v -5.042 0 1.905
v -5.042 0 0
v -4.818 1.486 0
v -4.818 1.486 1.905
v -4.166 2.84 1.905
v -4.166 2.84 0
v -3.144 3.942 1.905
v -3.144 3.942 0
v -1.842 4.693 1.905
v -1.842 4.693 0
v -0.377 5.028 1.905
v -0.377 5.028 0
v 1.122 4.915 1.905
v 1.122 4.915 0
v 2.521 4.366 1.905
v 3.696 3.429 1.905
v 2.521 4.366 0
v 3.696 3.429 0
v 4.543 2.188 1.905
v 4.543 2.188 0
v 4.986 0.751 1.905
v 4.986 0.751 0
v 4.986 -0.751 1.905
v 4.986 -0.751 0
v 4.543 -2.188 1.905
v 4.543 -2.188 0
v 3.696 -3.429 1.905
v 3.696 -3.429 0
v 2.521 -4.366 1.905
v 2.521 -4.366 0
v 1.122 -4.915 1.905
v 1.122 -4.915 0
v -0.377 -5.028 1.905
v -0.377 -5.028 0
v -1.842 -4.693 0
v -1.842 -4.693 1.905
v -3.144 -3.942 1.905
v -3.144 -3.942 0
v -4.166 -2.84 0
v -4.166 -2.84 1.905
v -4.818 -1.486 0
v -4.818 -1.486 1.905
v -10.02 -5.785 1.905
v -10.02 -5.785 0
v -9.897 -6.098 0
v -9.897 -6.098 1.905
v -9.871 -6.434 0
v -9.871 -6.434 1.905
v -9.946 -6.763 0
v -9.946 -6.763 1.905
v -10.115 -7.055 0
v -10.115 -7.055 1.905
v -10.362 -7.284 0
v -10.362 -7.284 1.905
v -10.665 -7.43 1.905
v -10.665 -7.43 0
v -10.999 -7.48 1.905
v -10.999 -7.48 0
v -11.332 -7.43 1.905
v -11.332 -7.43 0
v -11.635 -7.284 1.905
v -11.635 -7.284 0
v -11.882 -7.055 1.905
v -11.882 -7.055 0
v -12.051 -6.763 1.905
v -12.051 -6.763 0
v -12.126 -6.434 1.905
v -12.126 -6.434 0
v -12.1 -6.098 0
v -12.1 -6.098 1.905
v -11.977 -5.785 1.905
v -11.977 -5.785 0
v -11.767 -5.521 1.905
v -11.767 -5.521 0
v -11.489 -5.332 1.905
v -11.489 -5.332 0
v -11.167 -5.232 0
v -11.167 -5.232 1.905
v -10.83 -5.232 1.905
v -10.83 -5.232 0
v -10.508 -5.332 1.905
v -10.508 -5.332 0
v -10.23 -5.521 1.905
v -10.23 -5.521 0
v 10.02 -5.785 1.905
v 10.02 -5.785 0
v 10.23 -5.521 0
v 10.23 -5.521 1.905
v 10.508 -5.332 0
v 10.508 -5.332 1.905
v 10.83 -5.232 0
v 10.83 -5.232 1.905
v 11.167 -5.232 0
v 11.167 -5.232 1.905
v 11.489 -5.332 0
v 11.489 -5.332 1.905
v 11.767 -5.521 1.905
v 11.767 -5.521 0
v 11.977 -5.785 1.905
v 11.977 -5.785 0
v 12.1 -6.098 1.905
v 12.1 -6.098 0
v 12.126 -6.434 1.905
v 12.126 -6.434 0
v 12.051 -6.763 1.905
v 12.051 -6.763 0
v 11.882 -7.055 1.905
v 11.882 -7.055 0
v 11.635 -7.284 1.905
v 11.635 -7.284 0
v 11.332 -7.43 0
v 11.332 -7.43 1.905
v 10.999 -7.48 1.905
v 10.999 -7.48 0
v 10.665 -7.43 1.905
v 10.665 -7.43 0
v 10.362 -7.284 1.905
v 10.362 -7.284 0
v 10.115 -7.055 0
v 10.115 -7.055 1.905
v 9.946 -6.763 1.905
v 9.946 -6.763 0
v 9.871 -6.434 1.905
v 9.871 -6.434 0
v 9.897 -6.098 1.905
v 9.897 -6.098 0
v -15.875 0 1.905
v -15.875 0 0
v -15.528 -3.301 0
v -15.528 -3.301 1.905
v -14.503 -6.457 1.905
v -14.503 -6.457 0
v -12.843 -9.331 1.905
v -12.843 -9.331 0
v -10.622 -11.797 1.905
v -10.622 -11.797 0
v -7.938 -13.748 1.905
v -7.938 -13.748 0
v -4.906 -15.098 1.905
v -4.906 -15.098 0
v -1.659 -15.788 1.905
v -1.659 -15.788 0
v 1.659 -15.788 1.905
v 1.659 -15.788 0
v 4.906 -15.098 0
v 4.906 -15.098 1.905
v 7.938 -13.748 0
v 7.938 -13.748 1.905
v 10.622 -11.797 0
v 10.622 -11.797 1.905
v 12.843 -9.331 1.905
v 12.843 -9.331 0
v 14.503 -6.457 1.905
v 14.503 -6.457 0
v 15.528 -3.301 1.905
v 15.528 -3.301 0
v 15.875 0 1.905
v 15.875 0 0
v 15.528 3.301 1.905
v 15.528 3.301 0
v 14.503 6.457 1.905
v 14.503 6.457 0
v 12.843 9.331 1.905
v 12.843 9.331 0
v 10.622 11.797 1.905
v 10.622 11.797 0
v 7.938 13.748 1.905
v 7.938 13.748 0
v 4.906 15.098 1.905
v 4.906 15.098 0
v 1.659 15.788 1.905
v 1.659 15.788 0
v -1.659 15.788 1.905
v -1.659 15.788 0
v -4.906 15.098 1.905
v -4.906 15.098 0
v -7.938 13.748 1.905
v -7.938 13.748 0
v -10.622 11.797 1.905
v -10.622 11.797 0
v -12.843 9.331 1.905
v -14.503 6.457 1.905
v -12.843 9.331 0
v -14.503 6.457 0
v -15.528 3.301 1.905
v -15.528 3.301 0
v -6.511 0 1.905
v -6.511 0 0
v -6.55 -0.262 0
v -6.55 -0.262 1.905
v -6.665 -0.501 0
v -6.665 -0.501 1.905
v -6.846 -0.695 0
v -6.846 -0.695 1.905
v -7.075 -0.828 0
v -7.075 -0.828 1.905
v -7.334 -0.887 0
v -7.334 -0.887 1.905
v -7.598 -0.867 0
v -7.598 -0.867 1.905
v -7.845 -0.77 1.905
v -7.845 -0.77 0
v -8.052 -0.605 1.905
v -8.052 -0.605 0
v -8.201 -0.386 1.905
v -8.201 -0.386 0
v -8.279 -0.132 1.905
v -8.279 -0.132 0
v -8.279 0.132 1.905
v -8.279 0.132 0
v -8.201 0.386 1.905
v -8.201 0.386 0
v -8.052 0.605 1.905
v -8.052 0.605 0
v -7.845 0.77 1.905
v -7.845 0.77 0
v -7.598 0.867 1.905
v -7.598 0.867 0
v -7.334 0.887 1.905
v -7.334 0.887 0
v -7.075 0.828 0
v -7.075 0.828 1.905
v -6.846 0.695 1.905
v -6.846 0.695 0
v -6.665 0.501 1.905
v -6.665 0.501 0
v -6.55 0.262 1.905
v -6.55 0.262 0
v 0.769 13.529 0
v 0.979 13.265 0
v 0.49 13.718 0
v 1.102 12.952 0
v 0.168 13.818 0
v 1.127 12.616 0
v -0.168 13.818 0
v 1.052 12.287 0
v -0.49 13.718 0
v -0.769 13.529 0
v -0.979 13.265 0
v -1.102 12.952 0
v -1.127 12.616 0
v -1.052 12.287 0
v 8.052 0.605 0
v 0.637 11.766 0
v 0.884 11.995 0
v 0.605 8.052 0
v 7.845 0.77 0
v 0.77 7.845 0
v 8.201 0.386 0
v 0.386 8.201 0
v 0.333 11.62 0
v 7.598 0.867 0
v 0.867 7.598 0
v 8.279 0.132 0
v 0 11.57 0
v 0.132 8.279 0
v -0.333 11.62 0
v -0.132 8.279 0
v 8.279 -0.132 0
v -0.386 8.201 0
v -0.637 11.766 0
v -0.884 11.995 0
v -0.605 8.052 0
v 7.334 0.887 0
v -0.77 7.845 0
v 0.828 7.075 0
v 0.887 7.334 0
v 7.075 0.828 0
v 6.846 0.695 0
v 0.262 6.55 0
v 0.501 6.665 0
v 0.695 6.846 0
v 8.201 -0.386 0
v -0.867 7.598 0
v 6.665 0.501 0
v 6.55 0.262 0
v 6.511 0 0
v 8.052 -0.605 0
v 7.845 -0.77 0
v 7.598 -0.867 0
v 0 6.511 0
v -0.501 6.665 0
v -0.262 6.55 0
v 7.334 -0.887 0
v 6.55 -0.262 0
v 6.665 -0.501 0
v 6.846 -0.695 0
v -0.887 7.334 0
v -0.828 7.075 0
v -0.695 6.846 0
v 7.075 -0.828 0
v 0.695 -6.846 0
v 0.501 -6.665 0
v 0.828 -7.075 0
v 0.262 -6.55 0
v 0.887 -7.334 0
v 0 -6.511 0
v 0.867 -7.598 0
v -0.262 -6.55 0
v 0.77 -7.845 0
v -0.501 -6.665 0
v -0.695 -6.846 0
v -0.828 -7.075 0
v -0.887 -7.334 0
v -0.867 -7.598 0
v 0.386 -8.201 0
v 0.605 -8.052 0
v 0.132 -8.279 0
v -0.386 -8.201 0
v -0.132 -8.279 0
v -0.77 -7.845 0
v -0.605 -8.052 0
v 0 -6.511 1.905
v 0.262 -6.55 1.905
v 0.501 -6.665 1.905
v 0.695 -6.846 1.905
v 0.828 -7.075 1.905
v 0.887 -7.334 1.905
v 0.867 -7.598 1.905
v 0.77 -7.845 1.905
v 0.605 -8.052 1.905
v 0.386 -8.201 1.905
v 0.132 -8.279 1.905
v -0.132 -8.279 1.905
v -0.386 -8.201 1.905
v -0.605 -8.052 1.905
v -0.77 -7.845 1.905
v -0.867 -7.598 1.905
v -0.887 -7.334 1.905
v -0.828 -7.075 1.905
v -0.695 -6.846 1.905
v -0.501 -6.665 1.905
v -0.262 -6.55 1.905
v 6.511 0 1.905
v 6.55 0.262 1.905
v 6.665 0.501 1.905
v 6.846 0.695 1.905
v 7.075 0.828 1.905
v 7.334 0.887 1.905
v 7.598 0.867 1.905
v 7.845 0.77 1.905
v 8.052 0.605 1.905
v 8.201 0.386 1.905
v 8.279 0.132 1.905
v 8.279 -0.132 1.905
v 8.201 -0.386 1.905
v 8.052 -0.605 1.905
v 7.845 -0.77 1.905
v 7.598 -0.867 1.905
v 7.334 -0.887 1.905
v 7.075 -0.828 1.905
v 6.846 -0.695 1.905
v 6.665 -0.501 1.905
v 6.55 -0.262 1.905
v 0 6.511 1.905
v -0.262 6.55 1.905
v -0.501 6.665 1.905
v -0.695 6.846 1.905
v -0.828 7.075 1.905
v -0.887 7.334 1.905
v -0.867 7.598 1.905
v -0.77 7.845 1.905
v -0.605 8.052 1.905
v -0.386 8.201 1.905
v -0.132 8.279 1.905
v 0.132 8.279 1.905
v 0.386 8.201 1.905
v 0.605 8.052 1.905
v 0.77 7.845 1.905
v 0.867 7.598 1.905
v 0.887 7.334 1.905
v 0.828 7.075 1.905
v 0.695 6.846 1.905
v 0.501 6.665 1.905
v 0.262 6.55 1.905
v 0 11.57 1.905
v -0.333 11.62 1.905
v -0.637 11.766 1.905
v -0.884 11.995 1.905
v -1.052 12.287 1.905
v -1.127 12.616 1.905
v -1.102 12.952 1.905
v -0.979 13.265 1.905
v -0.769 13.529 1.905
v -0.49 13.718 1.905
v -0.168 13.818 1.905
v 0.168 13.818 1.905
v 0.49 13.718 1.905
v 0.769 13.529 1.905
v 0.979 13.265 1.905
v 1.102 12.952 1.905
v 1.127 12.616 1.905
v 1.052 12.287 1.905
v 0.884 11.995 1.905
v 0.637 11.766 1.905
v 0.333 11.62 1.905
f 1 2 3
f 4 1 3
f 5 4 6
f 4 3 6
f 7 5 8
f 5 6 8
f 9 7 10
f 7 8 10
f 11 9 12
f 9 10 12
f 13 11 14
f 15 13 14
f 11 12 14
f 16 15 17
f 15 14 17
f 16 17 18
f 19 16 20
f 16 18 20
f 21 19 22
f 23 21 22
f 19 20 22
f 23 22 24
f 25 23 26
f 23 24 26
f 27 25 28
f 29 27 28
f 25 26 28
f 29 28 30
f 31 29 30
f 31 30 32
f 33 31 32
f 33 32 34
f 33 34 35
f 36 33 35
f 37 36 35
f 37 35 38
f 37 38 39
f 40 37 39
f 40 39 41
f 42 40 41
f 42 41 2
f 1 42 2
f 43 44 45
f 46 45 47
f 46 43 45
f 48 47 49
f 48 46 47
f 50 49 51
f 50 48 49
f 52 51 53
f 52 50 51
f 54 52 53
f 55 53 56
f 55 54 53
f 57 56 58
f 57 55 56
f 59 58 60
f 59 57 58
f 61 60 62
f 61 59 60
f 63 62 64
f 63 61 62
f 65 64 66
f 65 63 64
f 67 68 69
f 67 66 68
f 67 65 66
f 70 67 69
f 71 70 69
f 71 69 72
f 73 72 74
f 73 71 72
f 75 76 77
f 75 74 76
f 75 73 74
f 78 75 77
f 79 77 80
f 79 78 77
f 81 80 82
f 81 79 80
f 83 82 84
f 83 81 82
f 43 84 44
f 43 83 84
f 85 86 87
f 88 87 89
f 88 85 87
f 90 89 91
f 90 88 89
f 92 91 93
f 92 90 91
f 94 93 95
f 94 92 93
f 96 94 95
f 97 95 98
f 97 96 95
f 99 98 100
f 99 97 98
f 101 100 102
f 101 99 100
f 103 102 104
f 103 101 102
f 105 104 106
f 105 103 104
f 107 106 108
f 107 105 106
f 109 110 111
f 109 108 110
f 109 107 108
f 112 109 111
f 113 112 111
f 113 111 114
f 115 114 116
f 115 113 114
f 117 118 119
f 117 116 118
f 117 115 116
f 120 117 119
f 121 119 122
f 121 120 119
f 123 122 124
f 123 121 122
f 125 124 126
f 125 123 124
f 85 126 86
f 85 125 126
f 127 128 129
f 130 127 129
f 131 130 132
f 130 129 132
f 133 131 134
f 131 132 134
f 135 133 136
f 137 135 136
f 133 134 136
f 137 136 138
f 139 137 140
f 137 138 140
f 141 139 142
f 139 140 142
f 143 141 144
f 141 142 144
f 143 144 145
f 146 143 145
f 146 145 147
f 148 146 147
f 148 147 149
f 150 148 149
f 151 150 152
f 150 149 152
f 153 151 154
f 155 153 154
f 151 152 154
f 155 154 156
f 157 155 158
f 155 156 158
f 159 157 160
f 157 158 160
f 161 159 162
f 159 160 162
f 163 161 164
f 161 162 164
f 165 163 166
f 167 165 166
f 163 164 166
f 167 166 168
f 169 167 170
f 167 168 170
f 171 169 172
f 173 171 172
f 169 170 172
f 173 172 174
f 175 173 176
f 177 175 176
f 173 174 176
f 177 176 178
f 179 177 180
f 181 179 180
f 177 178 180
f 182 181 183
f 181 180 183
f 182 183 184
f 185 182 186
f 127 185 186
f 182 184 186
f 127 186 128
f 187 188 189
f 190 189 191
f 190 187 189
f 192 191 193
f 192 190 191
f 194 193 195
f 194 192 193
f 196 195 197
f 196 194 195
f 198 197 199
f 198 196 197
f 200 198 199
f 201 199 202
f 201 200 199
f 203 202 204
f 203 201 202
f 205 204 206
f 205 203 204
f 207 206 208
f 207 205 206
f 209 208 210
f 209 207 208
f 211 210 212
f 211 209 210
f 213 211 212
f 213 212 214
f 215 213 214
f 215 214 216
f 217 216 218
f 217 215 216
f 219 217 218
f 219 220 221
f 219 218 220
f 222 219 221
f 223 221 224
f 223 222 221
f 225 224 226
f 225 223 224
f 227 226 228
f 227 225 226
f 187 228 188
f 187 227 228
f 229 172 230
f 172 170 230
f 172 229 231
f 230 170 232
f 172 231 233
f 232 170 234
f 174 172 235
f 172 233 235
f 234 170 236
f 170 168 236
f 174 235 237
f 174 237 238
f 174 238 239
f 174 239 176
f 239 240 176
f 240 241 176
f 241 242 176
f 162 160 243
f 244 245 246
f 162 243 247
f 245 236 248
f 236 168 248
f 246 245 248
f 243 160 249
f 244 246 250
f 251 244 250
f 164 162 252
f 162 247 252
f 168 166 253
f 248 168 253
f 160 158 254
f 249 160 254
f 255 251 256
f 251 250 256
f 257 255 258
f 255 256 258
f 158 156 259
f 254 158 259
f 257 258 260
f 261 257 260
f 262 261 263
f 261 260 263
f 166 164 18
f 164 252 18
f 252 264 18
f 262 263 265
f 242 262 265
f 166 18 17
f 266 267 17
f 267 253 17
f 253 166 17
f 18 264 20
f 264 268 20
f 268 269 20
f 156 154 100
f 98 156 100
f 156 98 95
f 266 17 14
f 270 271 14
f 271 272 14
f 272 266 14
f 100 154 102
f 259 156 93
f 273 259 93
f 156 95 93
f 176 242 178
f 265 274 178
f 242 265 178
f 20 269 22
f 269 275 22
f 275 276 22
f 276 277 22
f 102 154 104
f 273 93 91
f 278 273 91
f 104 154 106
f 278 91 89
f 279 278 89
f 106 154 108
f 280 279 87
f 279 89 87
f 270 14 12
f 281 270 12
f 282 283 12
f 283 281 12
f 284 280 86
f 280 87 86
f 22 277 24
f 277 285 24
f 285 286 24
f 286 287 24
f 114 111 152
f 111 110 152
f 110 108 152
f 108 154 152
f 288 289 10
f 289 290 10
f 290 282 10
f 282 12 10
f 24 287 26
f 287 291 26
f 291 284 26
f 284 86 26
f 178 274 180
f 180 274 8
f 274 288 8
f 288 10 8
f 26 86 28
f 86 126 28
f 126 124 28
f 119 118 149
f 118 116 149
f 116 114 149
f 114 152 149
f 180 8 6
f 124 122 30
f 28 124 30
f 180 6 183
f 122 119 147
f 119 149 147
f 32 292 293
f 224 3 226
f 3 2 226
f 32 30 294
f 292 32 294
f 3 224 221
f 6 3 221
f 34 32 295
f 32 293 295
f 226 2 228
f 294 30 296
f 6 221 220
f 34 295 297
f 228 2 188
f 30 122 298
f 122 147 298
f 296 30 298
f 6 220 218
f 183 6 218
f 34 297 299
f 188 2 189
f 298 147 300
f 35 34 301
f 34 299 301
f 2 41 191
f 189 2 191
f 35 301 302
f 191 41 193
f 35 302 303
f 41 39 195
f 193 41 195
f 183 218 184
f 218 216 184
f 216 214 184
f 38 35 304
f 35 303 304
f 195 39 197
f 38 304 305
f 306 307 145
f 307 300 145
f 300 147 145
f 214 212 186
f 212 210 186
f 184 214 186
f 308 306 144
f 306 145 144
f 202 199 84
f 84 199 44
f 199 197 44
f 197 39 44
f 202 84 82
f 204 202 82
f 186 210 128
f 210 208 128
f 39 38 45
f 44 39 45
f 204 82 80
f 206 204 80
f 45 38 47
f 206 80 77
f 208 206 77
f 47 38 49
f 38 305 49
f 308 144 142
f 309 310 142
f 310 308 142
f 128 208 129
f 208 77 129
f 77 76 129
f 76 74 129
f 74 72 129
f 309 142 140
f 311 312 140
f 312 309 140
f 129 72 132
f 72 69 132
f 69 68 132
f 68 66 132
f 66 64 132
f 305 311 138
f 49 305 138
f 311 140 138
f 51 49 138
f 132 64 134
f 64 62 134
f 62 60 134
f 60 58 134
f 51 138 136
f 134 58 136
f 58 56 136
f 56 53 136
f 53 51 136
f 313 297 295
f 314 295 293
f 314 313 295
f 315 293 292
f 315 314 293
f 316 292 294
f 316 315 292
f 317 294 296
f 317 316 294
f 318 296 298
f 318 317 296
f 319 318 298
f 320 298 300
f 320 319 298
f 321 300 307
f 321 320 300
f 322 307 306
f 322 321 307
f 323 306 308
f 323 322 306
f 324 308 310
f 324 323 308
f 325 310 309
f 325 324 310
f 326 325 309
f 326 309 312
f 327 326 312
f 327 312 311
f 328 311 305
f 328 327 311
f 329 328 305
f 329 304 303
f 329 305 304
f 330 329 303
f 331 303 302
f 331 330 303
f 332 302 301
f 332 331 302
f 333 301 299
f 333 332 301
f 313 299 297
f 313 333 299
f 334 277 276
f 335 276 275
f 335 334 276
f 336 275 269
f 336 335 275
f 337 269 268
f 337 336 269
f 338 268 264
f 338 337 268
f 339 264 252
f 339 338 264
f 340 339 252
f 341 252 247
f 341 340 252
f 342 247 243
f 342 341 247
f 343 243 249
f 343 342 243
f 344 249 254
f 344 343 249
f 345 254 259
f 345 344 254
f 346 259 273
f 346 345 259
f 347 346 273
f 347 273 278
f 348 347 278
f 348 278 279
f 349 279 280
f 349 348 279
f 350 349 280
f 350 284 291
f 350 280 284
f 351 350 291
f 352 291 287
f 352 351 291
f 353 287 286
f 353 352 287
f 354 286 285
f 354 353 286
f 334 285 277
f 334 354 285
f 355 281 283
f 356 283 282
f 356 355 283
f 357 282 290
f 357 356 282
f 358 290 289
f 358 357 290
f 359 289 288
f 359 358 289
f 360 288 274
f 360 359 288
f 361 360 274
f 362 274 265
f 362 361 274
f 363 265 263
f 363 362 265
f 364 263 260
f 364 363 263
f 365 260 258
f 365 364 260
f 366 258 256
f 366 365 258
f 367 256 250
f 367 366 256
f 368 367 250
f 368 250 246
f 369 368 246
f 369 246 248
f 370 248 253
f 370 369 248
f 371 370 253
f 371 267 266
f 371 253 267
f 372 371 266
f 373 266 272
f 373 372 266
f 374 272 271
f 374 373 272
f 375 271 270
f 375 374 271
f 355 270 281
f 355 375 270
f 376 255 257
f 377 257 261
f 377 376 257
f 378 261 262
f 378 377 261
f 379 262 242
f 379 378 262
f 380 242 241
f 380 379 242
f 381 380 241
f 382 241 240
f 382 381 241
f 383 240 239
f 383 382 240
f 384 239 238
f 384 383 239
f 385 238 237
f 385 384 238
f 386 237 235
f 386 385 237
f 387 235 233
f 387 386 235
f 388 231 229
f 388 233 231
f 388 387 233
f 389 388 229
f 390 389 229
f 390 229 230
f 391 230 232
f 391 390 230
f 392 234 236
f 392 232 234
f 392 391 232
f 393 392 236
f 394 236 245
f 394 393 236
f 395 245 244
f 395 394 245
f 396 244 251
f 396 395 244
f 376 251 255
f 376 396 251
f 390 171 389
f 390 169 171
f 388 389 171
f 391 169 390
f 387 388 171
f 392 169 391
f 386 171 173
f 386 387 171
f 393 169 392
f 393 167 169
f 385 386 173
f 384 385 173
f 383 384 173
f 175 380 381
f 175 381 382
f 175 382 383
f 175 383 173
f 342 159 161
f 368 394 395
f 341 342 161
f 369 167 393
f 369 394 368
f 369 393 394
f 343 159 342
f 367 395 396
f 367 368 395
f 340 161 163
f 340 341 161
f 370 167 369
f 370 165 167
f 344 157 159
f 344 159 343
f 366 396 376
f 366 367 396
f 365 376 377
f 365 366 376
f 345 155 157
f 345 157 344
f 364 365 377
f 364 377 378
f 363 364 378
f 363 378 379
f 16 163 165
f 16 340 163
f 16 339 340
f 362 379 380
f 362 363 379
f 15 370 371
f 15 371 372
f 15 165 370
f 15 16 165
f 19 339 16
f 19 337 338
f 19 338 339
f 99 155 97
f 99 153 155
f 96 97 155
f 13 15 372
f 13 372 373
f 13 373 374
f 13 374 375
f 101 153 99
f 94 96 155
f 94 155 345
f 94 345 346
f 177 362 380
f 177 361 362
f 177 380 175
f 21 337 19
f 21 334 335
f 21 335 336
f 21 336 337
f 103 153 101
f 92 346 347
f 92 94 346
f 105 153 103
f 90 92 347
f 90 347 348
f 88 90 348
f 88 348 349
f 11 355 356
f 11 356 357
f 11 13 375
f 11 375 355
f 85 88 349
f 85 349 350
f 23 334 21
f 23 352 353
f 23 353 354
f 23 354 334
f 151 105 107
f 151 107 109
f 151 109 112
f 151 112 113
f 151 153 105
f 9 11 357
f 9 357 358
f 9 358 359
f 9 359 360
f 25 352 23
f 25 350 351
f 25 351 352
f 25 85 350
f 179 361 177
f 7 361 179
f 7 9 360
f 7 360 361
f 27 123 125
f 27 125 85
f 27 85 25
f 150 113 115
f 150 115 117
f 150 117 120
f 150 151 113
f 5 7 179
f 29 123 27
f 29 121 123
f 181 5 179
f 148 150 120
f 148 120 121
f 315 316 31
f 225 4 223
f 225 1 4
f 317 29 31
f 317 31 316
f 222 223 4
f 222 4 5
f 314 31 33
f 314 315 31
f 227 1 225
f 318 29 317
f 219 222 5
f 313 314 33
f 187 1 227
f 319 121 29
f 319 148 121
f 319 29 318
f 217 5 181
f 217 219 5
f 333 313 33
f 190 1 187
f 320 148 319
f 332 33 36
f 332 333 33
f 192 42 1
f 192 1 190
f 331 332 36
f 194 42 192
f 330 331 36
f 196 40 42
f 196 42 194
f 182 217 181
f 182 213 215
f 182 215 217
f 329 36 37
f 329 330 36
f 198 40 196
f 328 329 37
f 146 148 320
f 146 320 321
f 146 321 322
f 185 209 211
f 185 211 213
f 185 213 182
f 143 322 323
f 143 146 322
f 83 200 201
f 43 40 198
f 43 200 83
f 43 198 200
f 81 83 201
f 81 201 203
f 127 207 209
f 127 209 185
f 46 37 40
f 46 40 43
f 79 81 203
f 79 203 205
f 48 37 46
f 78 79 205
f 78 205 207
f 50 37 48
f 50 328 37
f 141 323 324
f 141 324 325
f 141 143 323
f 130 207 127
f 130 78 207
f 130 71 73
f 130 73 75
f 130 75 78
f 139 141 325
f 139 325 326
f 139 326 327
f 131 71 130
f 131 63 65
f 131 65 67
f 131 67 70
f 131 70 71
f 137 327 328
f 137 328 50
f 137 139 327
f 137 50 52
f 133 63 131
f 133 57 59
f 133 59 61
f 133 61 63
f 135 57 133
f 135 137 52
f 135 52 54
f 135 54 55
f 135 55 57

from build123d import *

# Parameters (mm, degrees)
SKETCH1_R                    = 15.875
SKETCH1_R_2                  = 3.96875
BOSS_EXTRUDE1_DEPTH          = 1.905
X_0_397_DIAMETER_HOLE1_D     = 10.0838
X_0_397_DIAMETER_HOLE1_DEPTH = 12.7
X_0_397_DIAMETER_HOLE1_TIP   = 3.029479155
CIRPATTERN1_COUNT            = 3
CIRPATTERN2_COUNT            = 4


with BuildPart() as part:
    # Sketch1 → Boss-Extrude1 (new body)
    with BuildSketch(Plane.XY):
        with Locations(Location((0, 0, 0), (0, 0, 180))):
            Circle(SKETCH1_R)
        with Locations(Location((0, 0, 0), (0, 0, 180))):
            Circle(SKETCH1_R_2, mode=Mode.SUBTRACT)
    extrude(amount=BOSS_EXTRUDE1_DEPTH)

    # X (0.397) Diameter Hole1
    with Locations(Plane.XY.offset(1.905)):
        with Locations((0, 0)):
            Hole(X_0_397_DIAMETER_HOLE1_D / 2, depth=X_0_397_DIAMETER_HOLE1_DEPTH)
            with Locations((0, 0, -(X_0_397_DIAMETER_HOLE1_DEPTH + X_0_397_DIAMETER_HOLE1_TIP / 2))):  # 118° drill point
                Cone(0, X_0_397_DIAMETER_HOLE1_D / 2, X_0_397_DIAMETER_HOLE1_TIP, mode=Mode.SUBTRACT)

    # Sketch4 → #4-40 Tapped Hole1 (revolve, cut)
    with BuildSketch(Plane(origin=(0, 12.7, 1.905), x_dir=(0, -1, 0), z_dir=(1, 0, 0))):
        Polygon((0, 0), (0, 9.543752758), (1.1303, 8.8646), (1.1303, 0), align=None)
    f_4_40_tapped_hole1 = revolve(axis=Axis((0, 12.7, 8.255), (0, 0, -1)), mode=Mode.SUBTRACT)

    # CirPattern1: #4-40 Tapped Hole1 ×3 about axis
    cirpattern1_axis = Axis((0, 0, 0), (0, 0, 1))
    for i in range(1, CIRPATTERN1_COUNT):
        add(f_4_40_tapped_hole1.rotate(cirpattern1_axis, i * 360 / CIRPATTERN1_COUNT), mode=Mode.SUBTRACT)

    # Sketch6 → #2-56 Tapped Hole1 (revolve, cut)
    with BuildSketch(Plane(origin=(0, 7.4, 1.905), x_dir=(0, -1, 0), z_dir=(1, 0, 0))):
        Polygon((0, 0), (0, 7.18896509), (0.889, 6.6548), (0.889, 0), align=None)
    f_2_56_tapped_hole1 = revolve(axis=Axis((0, 7.4, 8.255), (0, 0, -1)), mode=Mode.SUBTRACT)

    # CirPattern2: #2-56 Tapped Hole1 ×4 about axis
    cirpattern2_axis = Axis((0, 0, 0), (0, 0, 1))
    for i in range(1, CIRPATTERN2_COUNT):
        add(f_2_56_tapped_hole1.rotate(cirpattern2_axis, i * 360 / CIRPATTERN2_COUNT), mode=Mode.SUBTRACT)


solid = part.part
